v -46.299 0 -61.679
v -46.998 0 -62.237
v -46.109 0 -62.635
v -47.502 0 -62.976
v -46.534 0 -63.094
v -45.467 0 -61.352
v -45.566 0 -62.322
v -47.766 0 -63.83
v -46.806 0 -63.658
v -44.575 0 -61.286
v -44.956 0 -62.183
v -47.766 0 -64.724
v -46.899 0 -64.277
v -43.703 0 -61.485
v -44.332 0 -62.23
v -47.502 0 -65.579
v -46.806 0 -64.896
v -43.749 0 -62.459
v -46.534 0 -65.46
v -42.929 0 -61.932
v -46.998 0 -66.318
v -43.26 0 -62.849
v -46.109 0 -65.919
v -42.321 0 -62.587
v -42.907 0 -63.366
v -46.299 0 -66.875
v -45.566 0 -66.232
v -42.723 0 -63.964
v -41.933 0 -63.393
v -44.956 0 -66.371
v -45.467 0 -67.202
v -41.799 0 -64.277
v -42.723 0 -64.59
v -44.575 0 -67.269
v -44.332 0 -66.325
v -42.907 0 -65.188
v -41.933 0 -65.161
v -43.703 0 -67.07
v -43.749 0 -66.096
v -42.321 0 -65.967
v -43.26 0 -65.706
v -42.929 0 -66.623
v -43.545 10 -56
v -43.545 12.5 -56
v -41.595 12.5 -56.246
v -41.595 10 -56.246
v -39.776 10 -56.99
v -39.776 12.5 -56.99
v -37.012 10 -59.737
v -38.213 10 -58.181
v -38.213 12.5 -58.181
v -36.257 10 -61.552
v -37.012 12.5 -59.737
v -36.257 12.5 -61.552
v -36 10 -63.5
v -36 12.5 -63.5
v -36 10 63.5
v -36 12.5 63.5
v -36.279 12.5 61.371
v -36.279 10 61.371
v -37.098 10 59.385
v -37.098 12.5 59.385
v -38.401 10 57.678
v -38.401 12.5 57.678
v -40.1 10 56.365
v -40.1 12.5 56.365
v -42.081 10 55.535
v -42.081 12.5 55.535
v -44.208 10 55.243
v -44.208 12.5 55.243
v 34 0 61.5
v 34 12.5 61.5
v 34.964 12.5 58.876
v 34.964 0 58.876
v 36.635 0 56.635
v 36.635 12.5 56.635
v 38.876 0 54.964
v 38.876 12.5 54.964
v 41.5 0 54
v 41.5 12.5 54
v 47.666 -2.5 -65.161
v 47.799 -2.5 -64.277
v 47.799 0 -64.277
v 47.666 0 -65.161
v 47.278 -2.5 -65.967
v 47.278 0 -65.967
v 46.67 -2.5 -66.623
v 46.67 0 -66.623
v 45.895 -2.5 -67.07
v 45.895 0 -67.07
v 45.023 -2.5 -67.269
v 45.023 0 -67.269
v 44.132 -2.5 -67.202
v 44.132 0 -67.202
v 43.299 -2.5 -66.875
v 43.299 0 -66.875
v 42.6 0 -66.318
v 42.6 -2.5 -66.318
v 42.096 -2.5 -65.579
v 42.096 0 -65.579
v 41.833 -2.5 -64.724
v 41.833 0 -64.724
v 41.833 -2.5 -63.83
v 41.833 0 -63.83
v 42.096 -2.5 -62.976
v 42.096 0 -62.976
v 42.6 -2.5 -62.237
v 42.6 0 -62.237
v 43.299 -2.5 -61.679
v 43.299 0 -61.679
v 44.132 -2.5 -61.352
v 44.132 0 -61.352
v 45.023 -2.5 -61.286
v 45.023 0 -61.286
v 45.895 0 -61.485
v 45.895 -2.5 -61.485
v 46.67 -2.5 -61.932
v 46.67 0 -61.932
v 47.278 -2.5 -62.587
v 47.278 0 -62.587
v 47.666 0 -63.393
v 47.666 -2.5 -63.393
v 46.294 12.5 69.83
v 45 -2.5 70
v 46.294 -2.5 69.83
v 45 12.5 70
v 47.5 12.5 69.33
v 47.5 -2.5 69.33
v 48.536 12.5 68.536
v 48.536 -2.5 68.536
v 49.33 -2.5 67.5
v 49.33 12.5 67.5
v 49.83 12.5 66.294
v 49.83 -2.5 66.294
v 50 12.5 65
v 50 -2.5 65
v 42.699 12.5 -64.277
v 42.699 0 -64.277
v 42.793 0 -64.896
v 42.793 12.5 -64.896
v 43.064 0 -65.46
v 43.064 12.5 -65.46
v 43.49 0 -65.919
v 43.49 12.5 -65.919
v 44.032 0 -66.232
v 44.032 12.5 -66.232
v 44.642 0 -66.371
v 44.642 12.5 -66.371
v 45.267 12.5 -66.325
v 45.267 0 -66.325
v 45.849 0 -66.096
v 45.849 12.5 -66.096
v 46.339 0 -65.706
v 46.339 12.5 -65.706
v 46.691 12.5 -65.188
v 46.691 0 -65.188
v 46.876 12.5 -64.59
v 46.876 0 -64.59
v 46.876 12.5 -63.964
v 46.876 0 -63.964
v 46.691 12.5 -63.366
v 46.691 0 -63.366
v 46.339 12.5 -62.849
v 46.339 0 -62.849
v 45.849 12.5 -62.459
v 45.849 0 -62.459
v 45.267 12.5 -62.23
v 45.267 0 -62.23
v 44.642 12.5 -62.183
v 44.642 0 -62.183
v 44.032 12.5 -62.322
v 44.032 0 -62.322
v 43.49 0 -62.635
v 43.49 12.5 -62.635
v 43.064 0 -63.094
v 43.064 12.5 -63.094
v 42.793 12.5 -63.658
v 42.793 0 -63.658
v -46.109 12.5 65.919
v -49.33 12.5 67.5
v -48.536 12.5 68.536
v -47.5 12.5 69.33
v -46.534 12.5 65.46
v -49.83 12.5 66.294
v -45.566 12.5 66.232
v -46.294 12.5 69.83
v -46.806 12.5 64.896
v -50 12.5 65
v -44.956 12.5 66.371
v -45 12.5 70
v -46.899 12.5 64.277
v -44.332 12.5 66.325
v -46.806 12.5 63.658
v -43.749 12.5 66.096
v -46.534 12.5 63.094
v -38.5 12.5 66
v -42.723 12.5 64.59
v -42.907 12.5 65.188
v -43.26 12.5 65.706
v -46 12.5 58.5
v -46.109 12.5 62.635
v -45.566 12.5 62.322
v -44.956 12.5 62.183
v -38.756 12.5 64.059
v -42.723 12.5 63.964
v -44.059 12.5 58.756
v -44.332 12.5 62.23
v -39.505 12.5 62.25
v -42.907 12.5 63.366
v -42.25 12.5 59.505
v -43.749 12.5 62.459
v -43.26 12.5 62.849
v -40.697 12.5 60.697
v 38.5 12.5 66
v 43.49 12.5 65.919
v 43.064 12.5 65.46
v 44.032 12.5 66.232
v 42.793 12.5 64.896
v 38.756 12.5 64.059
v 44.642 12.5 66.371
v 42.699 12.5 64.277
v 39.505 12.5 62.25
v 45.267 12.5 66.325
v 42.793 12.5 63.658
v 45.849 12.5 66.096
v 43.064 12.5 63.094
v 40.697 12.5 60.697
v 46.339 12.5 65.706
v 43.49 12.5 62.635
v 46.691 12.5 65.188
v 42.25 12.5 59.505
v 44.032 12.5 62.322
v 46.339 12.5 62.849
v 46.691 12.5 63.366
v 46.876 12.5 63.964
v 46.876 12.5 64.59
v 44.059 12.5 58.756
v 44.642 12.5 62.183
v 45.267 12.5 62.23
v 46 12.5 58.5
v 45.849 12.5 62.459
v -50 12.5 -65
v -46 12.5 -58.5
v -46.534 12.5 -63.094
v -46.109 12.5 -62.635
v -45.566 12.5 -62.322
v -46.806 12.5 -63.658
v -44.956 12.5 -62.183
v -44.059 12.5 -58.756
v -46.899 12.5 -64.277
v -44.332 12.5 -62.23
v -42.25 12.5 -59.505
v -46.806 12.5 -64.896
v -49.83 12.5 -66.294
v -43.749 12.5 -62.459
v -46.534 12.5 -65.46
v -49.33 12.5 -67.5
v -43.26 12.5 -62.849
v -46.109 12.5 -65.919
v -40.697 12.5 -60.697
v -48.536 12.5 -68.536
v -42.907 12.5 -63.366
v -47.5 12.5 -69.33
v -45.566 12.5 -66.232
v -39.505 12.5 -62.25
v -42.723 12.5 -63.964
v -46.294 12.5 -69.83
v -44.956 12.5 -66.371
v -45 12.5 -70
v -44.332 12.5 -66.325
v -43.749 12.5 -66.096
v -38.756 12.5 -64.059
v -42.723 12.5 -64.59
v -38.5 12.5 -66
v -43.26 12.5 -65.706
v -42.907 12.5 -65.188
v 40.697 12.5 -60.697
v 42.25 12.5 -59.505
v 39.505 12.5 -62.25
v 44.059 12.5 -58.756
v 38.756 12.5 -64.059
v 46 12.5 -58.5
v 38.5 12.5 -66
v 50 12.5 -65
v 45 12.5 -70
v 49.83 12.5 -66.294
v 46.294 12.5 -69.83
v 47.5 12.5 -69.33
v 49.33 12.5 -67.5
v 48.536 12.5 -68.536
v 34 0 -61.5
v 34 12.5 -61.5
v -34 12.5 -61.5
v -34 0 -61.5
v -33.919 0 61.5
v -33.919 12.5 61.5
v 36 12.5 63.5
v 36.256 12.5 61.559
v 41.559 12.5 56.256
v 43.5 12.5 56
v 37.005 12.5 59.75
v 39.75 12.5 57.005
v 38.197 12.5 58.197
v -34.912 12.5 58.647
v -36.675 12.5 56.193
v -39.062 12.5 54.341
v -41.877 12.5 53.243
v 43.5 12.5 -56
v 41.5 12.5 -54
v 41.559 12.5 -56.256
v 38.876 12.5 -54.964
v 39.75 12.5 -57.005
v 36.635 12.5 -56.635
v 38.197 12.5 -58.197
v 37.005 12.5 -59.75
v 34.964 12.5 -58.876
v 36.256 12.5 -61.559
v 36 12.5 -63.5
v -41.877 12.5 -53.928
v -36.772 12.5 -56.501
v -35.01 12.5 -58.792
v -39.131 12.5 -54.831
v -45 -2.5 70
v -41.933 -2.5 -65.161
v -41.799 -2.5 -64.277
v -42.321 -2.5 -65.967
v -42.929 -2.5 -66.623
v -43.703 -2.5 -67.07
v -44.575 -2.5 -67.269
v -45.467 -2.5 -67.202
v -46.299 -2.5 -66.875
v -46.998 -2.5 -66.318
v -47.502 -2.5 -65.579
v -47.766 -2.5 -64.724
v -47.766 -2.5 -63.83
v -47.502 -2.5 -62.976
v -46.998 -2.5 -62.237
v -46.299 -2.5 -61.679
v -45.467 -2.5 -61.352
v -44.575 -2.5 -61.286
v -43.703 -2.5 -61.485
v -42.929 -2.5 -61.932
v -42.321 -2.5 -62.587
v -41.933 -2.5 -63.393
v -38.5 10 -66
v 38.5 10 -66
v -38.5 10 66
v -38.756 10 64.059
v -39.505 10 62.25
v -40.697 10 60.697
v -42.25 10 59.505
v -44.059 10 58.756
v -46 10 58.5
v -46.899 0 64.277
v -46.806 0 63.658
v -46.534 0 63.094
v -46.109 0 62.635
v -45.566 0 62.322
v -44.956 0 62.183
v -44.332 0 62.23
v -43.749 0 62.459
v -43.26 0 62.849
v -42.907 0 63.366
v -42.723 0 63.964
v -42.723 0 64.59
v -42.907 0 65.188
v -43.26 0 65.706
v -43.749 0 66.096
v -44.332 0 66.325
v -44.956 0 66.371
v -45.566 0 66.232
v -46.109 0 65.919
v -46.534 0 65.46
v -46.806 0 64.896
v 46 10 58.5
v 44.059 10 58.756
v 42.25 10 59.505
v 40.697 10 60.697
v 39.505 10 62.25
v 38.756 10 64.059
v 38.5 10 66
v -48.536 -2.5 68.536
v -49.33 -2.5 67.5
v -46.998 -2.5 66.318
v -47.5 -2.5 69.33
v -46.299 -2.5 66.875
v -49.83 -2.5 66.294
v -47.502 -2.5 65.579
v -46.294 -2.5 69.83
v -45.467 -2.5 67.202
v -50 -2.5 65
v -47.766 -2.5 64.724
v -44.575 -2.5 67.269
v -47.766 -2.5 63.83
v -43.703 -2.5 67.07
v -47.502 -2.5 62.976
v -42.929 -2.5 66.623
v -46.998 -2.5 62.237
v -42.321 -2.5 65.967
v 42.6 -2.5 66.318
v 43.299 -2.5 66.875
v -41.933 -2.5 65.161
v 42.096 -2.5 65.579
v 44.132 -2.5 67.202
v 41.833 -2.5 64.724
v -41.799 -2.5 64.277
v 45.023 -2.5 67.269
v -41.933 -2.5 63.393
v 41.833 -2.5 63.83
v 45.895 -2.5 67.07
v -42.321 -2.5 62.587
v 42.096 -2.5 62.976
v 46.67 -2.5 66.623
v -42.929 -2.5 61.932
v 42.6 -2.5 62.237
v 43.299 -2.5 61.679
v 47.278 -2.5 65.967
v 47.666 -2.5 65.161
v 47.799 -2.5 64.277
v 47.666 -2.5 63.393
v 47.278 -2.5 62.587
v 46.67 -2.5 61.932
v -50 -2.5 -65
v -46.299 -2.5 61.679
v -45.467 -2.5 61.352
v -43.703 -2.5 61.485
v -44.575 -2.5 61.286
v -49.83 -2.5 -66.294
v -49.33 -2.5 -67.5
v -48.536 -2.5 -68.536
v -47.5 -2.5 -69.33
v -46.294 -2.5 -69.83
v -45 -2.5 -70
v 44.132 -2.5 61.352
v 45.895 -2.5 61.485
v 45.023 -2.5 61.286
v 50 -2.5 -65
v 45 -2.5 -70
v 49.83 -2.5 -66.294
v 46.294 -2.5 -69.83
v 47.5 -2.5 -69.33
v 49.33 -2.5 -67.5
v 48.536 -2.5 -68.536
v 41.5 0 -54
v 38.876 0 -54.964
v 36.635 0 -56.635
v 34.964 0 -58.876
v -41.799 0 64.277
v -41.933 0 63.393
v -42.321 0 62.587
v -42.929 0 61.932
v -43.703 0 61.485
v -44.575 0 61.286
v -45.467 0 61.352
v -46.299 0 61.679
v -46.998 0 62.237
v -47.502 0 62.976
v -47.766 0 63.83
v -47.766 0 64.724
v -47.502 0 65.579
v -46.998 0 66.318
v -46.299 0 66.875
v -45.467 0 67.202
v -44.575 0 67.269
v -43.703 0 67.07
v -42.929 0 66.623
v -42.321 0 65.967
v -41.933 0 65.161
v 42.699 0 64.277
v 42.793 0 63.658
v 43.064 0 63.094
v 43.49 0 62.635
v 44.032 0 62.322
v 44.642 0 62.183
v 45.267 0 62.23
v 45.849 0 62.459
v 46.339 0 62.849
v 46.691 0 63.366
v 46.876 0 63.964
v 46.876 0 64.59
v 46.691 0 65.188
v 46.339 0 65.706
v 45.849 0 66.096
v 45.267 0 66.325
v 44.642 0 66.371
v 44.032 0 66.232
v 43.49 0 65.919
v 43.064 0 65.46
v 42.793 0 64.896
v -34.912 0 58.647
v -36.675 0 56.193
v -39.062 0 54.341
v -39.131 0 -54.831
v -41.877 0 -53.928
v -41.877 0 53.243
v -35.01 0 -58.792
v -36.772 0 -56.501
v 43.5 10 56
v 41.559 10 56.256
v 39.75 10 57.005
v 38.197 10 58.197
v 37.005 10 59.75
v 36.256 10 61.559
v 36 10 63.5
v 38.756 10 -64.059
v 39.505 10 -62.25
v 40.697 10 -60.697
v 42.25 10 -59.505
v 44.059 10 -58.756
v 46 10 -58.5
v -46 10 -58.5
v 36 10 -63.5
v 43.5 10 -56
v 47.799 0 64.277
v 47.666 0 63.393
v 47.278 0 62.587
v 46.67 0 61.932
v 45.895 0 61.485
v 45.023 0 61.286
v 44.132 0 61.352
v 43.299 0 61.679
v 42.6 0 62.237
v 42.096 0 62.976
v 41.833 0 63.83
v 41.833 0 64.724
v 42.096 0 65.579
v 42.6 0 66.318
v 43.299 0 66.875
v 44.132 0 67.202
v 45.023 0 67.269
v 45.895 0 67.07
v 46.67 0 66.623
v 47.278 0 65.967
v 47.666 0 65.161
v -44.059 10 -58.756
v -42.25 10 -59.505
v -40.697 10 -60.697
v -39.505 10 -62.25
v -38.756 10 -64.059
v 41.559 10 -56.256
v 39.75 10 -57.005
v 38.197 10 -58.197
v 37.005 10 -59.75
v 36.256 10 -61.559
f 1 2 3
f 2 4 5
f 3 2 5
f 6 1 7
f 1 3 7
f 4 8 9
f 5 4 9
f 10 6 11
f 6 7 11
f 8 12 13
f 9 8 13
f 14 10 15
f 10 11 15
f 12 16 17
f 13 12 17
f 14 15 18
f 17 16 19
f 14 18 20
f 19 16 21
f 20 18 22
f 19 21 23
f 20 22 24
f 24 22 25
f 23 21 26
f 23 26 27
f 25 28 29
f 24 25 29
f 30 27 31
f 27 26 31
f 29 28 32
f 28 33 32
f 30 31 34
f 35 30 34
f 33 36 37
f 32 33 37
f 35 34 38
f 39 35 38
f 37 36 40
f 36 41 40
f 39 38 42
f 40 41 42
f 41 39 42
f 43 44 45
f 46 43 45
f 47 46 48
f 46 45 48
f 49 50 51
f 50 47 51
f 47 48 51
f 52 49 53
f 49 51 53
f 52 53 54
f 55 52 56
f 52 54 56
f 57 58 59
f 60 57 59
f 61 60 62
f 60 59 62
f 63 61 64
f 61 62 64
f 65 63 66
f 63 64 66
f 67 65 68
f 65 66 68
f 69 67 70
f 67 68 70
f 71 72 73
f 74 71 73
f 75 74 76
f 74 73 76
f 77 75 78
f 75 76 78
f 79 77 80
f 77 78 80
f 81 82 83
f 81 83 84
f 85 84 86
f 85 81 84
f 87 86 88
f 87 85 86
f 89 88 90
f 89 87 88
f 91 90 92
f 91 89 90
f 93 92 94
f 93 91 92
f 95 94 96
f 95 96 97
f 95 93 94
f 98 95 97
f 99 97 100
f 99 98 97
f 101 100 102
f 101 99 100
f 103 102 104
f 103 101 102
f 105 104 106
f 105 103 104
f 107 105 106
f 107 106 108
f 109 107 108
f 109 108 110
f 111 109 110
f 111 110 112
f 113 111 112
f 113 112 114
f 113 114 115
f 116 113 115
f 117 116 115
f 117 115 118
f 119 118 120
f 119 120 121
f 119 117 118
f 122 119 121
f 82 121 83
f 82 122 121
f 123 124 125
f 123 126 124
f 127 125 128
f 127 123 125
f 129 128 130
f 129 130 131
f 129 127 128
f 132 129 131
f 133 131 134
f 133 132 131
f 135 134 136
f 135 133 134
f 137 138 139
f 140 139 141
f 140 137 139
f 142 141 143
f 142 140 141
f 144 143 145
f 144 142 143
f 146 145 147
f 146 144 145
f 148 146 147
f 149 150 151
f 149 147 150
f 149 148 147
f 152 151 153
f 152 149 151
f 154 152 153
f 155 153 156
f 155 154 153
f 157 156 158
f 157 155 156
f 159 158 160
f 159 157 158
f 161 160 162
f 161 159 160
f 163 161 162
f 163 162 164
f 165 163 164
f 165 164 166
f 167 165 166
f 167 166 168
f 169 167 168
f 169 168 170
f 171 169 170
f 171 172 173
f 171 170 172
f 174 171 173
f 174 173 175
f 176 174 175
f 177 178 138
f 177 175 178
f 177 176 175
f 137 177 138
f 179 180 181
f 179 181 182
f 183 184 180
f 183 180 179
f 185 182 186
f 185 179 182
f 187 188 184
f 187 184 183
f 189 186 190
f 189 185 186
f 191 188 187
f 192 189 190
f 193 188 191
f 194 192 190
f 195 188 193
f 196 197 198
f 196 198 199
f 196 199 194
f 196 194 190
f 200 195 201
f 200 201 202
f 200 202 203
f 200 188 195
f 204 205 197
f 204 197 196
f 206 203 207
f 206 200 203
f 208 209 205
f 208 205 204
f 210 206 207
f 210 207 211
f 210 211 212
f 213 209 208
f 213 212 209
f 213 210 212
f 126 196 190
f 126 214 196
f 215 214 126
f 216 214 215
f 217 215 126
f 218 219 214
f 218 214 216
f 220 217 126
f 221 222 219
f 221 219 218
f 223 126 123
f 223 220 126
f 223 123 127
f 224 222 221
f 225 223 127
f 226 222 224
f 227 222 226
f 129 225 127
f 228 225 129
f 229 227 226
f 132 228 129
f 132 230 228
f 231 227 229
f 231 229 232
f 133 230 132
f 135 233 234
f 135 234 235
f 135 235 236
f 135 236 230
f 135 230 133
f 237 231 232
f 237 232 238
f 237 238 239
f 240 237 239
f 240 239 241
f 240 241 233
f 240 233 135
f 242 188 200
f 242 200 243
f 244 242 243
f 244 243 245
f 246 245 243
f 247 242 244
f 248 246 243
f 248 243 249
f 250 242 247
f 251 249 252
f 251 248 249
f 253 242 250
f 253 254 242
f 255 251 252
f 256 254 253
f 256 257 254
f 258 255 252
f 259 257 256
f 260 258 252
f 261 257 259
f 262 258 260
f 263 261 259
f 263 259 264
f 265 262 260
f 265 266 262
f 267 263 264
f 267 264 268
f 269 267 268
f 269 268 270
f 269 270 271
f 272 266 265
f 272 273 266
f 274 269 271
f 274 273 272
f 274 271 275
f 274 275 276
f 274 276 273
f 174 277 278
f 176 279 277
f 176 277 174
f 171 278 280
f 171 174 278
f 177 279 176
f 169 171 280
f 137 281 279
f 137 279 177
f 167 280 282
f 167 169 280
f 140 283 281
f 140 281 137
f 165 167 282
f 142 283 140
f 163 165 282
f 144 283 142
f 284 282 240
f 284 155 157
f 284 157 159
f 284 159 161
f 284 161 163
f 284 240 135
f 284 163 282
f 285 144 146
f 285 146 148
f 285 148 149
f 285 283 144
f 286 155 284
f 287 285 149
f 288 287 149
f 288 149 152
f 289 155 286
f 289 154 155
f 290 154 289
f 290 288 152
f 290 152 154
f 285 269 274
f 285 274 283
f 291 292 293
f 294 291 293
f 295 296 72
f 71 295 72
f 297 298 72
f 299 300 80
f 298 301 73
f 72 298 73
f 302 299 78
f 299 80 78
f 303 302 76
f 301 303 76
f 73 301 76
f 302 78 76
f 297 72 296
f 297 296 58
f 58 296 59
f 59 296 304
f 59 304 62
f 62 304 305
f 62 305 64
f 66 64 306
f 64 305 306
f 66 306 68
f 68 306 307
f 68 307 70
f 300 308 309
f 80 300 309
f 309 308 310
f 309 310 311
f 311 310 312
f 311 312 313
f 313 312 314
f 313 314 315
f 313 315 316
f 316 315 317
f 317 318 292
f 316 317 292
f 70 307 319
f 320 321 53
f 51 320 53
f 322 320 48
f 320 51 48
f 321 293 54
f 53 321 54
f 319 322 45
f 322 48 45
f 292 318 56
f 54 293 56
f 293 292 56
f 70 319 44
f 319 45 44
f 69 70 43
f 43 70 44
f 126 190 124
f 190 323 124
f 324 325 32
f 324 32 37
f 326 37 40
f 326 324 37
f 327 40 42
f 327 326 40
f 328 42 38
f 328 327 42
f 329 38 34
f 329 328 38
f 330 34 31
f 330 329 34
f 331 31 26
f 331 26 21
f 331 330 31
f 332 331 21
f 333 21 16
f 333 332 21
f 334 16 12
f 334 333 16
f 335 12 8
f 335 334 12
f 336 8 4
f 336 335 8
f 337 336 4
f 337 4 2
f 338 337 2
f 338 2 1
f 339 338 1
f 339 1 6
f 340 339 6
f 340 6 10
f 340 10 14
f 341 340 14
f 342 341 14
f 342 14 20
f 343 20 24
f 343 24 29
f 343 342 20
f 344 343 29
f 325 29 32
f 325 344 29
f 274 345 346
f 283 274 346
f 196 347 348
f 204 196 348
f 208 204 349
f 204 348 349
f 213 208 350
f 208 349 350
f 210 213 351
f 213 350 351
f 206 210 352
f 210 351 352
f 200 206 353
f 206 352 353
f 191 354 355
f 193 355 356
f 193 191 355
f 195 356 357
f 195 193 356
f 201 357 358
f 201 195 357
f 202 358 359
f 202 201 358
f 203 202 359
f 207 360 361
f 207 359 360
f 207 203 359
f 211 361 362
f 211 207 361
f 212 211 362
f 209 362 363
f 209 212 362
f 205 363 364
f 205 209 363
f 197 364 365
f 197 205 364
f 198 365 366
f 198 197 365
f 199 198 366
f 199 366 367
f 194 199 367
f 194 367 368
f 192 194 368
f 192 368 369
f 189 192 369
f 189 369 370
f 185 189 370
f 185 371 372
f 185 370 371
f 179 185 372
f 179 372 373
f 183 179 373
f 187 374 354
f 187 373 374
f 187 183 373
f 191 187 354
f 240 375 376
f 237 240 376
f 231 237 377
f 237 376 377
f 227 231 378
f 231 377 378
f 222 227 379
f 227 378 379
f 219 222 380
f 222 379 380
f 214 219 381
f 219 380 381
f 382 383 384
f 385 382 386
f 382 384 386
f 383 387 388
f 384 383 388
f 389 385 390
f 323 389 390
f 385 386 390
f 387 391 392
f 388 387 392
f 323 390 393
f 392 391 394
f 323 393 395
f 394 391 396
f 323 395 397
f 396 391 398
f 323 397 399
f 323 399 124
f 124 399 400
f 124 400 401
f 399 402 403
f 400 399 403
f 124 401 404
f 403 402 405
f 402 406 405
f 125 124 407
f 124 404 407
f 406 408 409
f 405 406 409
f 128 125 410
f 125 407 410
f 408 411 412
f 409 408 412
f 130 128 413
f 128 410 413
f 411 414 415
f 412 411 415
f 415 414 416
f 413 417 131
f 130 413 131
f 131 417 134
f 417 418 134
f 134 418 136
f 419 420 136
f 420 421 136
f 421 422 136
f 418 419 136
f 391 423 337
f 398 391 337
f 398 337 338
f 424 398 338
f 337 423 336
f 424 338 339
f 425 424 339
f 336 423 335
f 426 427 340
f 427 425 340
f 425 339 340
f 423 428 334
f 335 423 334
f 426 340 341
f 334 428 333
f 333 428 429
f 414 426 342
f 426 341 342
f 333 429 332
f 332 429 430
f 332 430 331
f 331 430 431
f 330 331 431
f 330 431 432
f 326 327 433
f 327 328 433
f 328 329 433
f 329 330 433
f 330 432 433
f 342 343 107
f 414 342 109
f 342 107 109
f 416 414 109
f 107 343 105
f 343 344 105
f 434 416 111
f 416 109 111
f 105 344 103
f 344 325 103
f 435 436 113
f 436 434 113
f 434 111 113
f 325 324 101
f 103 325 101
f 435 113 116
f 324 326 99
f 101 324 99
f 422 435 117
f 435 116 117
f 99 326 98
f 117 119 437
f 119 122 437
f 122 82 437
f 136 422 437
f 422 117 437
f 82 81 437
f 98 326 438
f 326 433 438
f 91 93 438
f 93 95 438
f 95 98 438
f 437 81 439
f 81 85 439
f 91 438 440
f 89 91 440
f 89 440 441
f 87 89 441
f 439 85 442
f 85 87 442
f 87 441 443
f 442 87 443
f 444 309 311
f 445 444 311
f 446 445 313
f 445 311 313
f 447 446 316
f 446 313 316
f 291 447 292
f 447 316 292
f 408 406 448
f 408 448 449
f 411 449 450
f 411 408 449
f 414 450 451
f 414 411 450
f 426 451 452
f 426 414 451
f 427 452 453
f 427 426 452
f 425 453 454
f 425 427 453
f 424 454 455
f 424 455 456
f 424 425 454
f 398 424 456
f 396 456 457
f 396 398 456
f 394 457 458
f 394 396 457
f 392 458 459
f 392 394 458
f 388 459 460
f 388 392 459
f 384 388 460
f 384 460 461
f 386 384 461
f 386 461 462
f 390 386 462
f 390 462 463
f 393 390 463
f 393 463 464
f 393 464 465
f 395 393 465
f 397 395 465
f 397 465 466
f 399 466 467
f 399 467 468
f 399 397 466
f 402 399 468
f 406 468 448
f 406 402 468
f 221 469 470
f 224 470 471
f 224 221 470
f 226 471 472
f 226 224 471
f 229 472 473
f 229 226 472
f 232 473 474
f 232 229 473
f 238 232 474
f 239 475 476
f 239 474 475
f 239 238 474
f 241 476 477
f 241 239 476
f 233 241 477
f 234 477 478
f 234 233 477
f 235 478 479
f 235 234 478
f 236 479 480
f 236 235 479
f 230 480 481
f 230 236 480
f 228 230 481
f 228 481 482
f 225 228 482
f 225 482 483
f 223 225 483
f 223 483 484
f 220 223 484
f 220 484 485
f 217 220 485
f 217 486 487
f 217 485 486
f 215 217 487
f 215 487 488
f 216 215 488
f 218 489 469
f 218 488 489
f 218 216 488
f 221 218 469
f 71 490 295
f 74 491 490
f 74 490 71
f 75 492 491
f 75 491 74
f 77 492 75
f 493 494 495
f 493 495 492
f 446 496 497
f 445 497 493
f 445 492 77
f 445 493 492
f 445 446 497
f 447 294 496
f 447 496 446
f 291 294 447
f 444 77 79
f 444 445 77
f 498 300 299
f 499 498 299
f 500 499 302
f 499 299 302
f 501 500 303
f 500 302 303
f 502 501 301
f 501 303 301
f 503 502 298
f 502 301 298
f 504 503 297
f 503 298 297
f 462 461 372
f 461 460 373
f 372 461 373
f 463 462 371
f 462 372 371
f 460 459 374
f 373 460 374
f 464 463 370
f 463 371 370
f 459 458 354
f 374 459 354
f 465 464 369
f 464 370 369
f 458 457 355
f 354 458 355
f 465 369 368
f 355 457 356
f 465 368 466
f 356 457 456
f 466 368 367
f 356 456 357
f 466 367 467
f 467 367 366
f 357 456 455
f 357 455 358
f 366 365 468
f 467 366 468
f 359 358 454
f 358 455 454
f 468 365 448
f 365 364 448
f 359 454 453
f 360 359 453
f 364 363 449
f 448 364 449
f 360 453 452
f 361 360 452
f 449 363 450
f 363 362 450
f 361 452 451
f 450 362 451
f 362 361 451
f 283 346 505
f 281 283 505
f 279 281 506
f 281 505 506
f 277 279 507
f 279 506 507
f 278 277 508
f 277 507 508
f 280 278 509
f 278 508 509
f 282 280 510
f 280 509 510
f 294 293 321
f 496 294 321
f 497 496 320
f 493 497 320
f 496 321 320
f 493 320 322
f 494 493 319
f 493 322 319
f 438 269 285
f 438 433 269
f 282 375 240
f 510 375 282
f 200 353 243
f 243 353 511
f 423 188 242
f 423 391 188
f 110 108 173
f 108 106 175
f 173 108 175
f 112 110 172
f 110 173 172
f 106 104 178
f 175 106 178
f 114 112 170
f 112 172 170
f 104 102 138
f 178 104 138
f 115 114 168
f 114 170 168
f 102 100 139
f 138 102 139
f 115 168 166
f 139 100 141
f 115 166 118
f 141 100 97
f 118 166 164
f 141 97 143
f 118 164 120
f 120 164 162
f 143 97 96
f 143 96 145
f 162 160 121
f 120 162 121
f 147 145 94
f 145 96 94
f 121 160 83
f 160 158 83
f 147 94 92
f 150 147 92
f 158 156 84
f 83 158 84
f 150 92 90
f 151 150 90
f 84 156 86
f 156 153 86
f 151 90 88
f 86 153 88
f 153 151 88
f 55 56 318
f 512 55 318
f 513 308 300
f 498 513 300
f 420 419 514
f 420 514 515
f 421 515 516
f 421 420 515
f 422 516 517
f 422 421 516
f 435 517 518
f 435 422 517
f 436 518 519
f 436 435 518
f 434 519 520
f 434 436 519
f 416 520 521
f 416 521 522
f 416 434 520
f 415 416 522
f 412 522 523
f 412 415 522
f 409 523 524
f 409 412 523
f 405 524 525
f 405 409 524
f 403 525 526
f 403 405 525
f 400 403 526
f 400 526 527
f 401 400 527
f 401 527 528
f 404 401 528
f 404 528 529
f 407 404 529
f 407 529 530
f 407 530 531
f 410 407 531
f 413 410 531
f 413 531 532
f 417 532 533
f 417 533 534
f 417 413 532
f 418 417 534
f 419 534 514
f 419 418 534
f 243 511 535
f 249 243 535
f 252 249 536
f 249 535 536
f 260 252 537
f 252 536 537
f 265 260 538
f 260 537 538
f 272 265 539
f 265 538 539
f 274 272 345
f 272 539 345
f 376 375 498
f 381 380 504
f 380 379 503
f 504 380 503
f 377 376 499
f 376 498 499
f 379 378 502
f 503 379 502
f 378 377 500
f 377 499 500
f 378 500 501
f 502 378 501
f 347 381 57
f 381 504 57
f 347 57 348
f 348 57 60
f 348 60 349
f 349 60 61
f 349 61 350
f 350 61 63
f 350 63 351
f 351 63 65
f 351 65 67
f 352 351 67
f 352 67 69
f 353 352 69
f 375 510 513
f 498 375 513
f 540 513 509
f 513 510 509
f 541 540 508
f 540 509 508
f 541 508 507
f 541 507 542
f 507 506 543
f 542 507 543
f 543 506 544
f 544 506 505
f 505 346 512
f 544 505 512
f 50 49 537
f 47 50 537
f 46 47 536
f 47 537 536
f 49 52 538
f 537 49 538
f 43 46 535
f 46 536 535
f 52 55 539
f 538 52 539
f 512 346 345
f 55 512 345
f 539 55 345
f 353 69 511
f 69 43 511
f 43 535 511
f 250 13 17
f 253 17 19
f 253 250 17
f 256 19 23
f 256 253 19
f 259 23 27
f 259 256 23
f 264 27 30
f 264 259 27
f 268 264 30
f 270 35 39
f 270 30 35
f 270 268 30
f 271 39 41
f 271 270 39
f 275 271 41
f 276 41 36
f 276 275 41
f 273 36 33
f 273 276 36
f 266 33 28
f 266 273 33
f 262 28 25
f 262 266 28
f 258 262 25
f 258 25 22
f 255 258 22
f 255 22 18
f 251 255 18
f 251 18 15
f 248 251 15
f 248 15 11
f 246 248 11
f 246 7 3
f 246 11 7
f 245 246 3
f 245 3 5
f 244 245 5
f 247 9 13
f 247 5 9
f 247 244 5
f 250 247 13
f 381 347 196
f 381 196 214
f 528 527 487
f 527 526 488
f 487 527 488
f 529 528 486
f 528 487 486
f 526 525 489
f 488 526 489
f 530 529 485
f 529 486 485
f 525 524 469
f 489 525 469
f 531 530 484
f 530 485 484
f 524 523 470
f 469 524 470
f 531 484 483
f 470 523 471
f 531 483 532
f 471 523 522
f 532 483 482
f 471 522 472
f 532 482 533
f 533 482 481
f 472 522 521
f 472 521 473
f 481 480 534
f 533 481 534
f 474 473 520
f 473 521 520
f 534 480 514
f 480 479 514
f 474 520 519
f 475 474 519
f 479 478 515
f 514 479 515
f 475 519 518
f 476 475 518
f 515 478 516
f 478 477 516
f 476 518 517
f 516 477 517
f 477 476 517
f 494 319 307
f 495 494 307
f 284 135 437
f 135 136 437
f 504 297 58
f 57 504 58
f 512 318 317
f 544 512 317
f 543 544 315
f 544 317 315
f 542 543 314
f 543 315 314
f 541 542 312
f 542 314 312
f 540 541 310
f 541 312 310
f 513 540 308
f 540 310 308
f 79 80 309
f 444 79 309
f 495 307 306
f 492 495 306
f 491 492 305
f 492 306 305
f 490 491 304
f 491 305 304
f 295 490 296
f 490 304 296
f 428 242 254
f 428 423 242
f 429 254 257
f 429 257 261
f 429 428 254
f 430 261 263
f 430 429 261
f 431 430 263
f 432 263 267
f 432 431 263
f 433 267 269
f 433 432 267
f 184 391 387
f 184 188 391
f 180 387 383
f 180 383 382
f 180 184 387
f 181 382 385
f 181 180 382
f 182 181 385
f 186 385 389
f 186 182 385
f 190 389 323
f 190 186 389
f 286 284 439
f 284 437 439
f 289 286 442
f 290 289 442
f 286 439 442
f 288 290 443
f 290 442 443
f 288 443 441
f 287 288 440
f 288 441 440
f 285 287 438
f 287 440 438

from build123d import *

# Parameters (mm, degrees)
BASE_W              = 100
BASE_H              = 140
BOTTOM_DEPTH        = 2.5
WALL_W              = 100
WALL_H              = 140
WALL_W_2            = 92
WALL_H_2            = 132
WALLS_DEPTH         = 12.5
MAINFILLET_R        = 5
DRILLHOLES_R        = 2.1
DRILLING_DEPTH      = 45
SKETCH8_R           = 3
CUT_EXTRUDE2_DEPTH  = 2.5
BOSS_EXTRUDE1_DEPTH = 12.5
BOSS_EXTRUDE2_DEPTH = 10


with BuildPart() as part:
    # Base → Bottom (new body)
    with BuildSketch(Plane(origin=(0, 0, 0), x_dir=(1, 0, 0), z_dir=(0, 1, 0))):
        Rectangle(BASE_W, BASE_H)
    extrude(amount=-BOTTOM_DEPTH)

    # Wall → Walls (add)
    with BuildSketch(Plane(origin=(0, 0, 0), x_dir=(1, 0, 0), z_dir=(0, 1, 0))):
        Rectangle(WALL_W, WALL_H)
        Rectangle(WALL_W_2, WALL_H_2, mode=Mode.SUBTRACT)
        with BuildLine():
            Line((-46, -58.5), (-46, -66))
            Line((-46, -66), (-38.5, -66))
            ThreePointArc((-38.5, -66), (-40.696699141, -60.696699141), (-46, -58.5))
        make_face()
        with BuildLine():
            ThreePointArc((46, -58.5), (40.696699141, -60.696699141), (38.5, -66))
            Line((38.5, -66), (46, -66))
            Line((46, -66), (46, -58.5))
        make_face()
        with BuildLine():
            Line((-46, 66), (-46, 58.5))
            ThreePointArc((-46, 58.5), (-40.696699141, 60.696699141), (-38.5, 66))
            Line((-38.5, 66), (-46, 66))
        make_face()
        with BuildLine():
            Line((46, 66), (38.5, 66))
            ThreePointArc((38.5, 66), (40.696699141, 60.696699141), (46, 58.5))
            Line((46, 58.5), (46, 66))
        make_face()
    extrude(amount=WALLS_DEPTH)

    # MainFillet
    mainfillet_edges = [part.edges().sort_by_distance(p)[0] for p in [
        (50, 5, -70),
        (50, 5, 70),
        (-50, 5, 70),
        (-50, 5, -70),
    ]]
    fillet(mainfillet_edges, radius=MAINFILLET_R)

    # DrillHoles → Drilling (cut)
    with BuildSketch(Plane(origin=(0, 12.5, 0), x_dir=(-1, 0, 0), z_dir=(0, -1, 0))):
        with Locations((44.79923541, 64.27716385)):
            Circle(DRILLHOLES_R)
        with Locations((44.79923541, -64.27716385)):
            Circle(DRILLHOLES_R)
        with Locations((-44.79923541, -64.27716385)):
            Circle(DRILLHOLES_R)
        with Locations((-44.79923541, 64.27716385)):
            Circle(DRILLHOLES_R)
    extrude(amount=DRILLING_DEPTH, mode=Mode.SUBTRACT)

    # Sketch8 → Cut-Extrude2 (cut)
    with BuildSketch(Plane(origin=(0, -2.5, 0), x_dir=(1, 0, 0), z_dir=(0, 1, 0))):
        with Locations((-44.79923541, 64.27716385)):
            Circle(SKETCH8_R)
        with Locations((44.79923541, 64.27716385)):
            Circle(SKETCH8_R)
        with Locations((-44.79923541, -64.27716385)):
            Circle(SKETCH8_R)
        with Locations((44.79923541, -64.27716385)):
            Circle(SKETCH8_R)
    extrude(amount=CUT_EXTRUDE2_DEPTH, mode=Mode.SUBTRACT)

    # Extrusion → Boss-Extrude1 (add)
    with BuildSketch(Plane(origin=(0, 12.5, 0), x_dir=(-1, 0, 0), z_dir=(0, -1, 0))):
        with BuildLine():
            Line((44.208318845, -55.242571154), (43.54473793, 56.000133433))
            ThreePointArc((43.54473793, 56.000133433), (38.212540046, 58.180905412), (36, 63.5))
            Line((36, 63.5), (-36, 63.5))
            ThreePointArc((-36, 63.5), (-38.196699141, 58.196699141), (-43.5, 56))
            Line((-43.5, 56), (-43.5, -56))
            ThreePointArc((-43.5, -56), (-38.196699141, -58.196699141), (-36, -63.5))
            Line((-36, -63.5), (36, -63.5))
            ThreePointArc((36, -63.5), (38.401198888, -57.678453182), (44.208318845, -55.242571154))
        make_face()
        with BuildLine():
            Line((41.876528387, 53.928461988), (41.876528387, -53.242571154))
            ThreePointArc((41.876528387, -53.242571154), (36.675168704, -56.193062448), (33.919092643, -61.5))
            Line((33.919092643, -61.5), (-34, -61.5))
            ThreePointArc((-34, -61.5), (-36.635234891, -56.635234891), (-41.5, -54))
            Line((-41.5, -54), (-41.5, 54))
            ThreePointArc((-41.5, 54), (-36.635234891, 56.635234891), (-34, 61.5))
            Line((-34, 61.5), (34, 61.5))
            ThreePointArc((34, 61.5), (36.772076684, 56.501068092), (41.876528387, 53.928461988))
        make_face(mode=Mode.SUBTRACT)
    extrude(amount=BOSS_EXTRUDE1_DEPTH)

    # Gasket → Boss-Extrude2 (add)
    with BuildSketch(Plane(origin=(0, 0, 0), x_dir=(1, 0, 0), z_dir=(0, 1, 0))):
        with BuildLine():
            Line((-38.5, 66), (38.5, 66))
            ThreePointArc((38.5, 66), (40.696699141, 60.696699141), (46, 58.5))
            Line((46, 58.5), (46, -58.5))
            ThreePointArc((46, -58.5), (40.696699141, -60.696699141), (38.5, -66))
            Line((38.5, -66), (-38.5, -66))
            ThreePointArc((-38.5, -66), (-40.696699141, -60.696699141), (-46, -58.5))
            Line((-46, -58.5), (-46, 58.5))
            ThreePointArc((-46, 58.5), (-40.696699141, 60.696699141), (-38.5, 66))
        make_face()
        with BuildLine():
            Line((-36, -63.5), (36, -63.5))
            ThreePointArc((36, -63.5), (38.196699141, -58.196699141), (43.5, -56))
            Line((43.5, -56), (43.5, 56))
            ThreePointArc((43.5, 56), (38.196699141, 58.196699141), (36, 63.5))
            Line((36, 63.5), (-36, 63.5))
            ThreePointArc((-36, 63.5), (-38.212540046, 58.180905412), (-43.54473793, 56.000133433))
            Line((-43.54473793, 56.000133433), (-44.208318845, -55.242571154))
            ThreePointArc((-44.208318845, -55.242571154), (-38.401198888, -57.678453182), (-36, -63.5))
        make_face(mode=Mode.SUBTRACT)
    extrude(amount=BOSS_EXTRUDE2_DEPTH)


solid = part.part
